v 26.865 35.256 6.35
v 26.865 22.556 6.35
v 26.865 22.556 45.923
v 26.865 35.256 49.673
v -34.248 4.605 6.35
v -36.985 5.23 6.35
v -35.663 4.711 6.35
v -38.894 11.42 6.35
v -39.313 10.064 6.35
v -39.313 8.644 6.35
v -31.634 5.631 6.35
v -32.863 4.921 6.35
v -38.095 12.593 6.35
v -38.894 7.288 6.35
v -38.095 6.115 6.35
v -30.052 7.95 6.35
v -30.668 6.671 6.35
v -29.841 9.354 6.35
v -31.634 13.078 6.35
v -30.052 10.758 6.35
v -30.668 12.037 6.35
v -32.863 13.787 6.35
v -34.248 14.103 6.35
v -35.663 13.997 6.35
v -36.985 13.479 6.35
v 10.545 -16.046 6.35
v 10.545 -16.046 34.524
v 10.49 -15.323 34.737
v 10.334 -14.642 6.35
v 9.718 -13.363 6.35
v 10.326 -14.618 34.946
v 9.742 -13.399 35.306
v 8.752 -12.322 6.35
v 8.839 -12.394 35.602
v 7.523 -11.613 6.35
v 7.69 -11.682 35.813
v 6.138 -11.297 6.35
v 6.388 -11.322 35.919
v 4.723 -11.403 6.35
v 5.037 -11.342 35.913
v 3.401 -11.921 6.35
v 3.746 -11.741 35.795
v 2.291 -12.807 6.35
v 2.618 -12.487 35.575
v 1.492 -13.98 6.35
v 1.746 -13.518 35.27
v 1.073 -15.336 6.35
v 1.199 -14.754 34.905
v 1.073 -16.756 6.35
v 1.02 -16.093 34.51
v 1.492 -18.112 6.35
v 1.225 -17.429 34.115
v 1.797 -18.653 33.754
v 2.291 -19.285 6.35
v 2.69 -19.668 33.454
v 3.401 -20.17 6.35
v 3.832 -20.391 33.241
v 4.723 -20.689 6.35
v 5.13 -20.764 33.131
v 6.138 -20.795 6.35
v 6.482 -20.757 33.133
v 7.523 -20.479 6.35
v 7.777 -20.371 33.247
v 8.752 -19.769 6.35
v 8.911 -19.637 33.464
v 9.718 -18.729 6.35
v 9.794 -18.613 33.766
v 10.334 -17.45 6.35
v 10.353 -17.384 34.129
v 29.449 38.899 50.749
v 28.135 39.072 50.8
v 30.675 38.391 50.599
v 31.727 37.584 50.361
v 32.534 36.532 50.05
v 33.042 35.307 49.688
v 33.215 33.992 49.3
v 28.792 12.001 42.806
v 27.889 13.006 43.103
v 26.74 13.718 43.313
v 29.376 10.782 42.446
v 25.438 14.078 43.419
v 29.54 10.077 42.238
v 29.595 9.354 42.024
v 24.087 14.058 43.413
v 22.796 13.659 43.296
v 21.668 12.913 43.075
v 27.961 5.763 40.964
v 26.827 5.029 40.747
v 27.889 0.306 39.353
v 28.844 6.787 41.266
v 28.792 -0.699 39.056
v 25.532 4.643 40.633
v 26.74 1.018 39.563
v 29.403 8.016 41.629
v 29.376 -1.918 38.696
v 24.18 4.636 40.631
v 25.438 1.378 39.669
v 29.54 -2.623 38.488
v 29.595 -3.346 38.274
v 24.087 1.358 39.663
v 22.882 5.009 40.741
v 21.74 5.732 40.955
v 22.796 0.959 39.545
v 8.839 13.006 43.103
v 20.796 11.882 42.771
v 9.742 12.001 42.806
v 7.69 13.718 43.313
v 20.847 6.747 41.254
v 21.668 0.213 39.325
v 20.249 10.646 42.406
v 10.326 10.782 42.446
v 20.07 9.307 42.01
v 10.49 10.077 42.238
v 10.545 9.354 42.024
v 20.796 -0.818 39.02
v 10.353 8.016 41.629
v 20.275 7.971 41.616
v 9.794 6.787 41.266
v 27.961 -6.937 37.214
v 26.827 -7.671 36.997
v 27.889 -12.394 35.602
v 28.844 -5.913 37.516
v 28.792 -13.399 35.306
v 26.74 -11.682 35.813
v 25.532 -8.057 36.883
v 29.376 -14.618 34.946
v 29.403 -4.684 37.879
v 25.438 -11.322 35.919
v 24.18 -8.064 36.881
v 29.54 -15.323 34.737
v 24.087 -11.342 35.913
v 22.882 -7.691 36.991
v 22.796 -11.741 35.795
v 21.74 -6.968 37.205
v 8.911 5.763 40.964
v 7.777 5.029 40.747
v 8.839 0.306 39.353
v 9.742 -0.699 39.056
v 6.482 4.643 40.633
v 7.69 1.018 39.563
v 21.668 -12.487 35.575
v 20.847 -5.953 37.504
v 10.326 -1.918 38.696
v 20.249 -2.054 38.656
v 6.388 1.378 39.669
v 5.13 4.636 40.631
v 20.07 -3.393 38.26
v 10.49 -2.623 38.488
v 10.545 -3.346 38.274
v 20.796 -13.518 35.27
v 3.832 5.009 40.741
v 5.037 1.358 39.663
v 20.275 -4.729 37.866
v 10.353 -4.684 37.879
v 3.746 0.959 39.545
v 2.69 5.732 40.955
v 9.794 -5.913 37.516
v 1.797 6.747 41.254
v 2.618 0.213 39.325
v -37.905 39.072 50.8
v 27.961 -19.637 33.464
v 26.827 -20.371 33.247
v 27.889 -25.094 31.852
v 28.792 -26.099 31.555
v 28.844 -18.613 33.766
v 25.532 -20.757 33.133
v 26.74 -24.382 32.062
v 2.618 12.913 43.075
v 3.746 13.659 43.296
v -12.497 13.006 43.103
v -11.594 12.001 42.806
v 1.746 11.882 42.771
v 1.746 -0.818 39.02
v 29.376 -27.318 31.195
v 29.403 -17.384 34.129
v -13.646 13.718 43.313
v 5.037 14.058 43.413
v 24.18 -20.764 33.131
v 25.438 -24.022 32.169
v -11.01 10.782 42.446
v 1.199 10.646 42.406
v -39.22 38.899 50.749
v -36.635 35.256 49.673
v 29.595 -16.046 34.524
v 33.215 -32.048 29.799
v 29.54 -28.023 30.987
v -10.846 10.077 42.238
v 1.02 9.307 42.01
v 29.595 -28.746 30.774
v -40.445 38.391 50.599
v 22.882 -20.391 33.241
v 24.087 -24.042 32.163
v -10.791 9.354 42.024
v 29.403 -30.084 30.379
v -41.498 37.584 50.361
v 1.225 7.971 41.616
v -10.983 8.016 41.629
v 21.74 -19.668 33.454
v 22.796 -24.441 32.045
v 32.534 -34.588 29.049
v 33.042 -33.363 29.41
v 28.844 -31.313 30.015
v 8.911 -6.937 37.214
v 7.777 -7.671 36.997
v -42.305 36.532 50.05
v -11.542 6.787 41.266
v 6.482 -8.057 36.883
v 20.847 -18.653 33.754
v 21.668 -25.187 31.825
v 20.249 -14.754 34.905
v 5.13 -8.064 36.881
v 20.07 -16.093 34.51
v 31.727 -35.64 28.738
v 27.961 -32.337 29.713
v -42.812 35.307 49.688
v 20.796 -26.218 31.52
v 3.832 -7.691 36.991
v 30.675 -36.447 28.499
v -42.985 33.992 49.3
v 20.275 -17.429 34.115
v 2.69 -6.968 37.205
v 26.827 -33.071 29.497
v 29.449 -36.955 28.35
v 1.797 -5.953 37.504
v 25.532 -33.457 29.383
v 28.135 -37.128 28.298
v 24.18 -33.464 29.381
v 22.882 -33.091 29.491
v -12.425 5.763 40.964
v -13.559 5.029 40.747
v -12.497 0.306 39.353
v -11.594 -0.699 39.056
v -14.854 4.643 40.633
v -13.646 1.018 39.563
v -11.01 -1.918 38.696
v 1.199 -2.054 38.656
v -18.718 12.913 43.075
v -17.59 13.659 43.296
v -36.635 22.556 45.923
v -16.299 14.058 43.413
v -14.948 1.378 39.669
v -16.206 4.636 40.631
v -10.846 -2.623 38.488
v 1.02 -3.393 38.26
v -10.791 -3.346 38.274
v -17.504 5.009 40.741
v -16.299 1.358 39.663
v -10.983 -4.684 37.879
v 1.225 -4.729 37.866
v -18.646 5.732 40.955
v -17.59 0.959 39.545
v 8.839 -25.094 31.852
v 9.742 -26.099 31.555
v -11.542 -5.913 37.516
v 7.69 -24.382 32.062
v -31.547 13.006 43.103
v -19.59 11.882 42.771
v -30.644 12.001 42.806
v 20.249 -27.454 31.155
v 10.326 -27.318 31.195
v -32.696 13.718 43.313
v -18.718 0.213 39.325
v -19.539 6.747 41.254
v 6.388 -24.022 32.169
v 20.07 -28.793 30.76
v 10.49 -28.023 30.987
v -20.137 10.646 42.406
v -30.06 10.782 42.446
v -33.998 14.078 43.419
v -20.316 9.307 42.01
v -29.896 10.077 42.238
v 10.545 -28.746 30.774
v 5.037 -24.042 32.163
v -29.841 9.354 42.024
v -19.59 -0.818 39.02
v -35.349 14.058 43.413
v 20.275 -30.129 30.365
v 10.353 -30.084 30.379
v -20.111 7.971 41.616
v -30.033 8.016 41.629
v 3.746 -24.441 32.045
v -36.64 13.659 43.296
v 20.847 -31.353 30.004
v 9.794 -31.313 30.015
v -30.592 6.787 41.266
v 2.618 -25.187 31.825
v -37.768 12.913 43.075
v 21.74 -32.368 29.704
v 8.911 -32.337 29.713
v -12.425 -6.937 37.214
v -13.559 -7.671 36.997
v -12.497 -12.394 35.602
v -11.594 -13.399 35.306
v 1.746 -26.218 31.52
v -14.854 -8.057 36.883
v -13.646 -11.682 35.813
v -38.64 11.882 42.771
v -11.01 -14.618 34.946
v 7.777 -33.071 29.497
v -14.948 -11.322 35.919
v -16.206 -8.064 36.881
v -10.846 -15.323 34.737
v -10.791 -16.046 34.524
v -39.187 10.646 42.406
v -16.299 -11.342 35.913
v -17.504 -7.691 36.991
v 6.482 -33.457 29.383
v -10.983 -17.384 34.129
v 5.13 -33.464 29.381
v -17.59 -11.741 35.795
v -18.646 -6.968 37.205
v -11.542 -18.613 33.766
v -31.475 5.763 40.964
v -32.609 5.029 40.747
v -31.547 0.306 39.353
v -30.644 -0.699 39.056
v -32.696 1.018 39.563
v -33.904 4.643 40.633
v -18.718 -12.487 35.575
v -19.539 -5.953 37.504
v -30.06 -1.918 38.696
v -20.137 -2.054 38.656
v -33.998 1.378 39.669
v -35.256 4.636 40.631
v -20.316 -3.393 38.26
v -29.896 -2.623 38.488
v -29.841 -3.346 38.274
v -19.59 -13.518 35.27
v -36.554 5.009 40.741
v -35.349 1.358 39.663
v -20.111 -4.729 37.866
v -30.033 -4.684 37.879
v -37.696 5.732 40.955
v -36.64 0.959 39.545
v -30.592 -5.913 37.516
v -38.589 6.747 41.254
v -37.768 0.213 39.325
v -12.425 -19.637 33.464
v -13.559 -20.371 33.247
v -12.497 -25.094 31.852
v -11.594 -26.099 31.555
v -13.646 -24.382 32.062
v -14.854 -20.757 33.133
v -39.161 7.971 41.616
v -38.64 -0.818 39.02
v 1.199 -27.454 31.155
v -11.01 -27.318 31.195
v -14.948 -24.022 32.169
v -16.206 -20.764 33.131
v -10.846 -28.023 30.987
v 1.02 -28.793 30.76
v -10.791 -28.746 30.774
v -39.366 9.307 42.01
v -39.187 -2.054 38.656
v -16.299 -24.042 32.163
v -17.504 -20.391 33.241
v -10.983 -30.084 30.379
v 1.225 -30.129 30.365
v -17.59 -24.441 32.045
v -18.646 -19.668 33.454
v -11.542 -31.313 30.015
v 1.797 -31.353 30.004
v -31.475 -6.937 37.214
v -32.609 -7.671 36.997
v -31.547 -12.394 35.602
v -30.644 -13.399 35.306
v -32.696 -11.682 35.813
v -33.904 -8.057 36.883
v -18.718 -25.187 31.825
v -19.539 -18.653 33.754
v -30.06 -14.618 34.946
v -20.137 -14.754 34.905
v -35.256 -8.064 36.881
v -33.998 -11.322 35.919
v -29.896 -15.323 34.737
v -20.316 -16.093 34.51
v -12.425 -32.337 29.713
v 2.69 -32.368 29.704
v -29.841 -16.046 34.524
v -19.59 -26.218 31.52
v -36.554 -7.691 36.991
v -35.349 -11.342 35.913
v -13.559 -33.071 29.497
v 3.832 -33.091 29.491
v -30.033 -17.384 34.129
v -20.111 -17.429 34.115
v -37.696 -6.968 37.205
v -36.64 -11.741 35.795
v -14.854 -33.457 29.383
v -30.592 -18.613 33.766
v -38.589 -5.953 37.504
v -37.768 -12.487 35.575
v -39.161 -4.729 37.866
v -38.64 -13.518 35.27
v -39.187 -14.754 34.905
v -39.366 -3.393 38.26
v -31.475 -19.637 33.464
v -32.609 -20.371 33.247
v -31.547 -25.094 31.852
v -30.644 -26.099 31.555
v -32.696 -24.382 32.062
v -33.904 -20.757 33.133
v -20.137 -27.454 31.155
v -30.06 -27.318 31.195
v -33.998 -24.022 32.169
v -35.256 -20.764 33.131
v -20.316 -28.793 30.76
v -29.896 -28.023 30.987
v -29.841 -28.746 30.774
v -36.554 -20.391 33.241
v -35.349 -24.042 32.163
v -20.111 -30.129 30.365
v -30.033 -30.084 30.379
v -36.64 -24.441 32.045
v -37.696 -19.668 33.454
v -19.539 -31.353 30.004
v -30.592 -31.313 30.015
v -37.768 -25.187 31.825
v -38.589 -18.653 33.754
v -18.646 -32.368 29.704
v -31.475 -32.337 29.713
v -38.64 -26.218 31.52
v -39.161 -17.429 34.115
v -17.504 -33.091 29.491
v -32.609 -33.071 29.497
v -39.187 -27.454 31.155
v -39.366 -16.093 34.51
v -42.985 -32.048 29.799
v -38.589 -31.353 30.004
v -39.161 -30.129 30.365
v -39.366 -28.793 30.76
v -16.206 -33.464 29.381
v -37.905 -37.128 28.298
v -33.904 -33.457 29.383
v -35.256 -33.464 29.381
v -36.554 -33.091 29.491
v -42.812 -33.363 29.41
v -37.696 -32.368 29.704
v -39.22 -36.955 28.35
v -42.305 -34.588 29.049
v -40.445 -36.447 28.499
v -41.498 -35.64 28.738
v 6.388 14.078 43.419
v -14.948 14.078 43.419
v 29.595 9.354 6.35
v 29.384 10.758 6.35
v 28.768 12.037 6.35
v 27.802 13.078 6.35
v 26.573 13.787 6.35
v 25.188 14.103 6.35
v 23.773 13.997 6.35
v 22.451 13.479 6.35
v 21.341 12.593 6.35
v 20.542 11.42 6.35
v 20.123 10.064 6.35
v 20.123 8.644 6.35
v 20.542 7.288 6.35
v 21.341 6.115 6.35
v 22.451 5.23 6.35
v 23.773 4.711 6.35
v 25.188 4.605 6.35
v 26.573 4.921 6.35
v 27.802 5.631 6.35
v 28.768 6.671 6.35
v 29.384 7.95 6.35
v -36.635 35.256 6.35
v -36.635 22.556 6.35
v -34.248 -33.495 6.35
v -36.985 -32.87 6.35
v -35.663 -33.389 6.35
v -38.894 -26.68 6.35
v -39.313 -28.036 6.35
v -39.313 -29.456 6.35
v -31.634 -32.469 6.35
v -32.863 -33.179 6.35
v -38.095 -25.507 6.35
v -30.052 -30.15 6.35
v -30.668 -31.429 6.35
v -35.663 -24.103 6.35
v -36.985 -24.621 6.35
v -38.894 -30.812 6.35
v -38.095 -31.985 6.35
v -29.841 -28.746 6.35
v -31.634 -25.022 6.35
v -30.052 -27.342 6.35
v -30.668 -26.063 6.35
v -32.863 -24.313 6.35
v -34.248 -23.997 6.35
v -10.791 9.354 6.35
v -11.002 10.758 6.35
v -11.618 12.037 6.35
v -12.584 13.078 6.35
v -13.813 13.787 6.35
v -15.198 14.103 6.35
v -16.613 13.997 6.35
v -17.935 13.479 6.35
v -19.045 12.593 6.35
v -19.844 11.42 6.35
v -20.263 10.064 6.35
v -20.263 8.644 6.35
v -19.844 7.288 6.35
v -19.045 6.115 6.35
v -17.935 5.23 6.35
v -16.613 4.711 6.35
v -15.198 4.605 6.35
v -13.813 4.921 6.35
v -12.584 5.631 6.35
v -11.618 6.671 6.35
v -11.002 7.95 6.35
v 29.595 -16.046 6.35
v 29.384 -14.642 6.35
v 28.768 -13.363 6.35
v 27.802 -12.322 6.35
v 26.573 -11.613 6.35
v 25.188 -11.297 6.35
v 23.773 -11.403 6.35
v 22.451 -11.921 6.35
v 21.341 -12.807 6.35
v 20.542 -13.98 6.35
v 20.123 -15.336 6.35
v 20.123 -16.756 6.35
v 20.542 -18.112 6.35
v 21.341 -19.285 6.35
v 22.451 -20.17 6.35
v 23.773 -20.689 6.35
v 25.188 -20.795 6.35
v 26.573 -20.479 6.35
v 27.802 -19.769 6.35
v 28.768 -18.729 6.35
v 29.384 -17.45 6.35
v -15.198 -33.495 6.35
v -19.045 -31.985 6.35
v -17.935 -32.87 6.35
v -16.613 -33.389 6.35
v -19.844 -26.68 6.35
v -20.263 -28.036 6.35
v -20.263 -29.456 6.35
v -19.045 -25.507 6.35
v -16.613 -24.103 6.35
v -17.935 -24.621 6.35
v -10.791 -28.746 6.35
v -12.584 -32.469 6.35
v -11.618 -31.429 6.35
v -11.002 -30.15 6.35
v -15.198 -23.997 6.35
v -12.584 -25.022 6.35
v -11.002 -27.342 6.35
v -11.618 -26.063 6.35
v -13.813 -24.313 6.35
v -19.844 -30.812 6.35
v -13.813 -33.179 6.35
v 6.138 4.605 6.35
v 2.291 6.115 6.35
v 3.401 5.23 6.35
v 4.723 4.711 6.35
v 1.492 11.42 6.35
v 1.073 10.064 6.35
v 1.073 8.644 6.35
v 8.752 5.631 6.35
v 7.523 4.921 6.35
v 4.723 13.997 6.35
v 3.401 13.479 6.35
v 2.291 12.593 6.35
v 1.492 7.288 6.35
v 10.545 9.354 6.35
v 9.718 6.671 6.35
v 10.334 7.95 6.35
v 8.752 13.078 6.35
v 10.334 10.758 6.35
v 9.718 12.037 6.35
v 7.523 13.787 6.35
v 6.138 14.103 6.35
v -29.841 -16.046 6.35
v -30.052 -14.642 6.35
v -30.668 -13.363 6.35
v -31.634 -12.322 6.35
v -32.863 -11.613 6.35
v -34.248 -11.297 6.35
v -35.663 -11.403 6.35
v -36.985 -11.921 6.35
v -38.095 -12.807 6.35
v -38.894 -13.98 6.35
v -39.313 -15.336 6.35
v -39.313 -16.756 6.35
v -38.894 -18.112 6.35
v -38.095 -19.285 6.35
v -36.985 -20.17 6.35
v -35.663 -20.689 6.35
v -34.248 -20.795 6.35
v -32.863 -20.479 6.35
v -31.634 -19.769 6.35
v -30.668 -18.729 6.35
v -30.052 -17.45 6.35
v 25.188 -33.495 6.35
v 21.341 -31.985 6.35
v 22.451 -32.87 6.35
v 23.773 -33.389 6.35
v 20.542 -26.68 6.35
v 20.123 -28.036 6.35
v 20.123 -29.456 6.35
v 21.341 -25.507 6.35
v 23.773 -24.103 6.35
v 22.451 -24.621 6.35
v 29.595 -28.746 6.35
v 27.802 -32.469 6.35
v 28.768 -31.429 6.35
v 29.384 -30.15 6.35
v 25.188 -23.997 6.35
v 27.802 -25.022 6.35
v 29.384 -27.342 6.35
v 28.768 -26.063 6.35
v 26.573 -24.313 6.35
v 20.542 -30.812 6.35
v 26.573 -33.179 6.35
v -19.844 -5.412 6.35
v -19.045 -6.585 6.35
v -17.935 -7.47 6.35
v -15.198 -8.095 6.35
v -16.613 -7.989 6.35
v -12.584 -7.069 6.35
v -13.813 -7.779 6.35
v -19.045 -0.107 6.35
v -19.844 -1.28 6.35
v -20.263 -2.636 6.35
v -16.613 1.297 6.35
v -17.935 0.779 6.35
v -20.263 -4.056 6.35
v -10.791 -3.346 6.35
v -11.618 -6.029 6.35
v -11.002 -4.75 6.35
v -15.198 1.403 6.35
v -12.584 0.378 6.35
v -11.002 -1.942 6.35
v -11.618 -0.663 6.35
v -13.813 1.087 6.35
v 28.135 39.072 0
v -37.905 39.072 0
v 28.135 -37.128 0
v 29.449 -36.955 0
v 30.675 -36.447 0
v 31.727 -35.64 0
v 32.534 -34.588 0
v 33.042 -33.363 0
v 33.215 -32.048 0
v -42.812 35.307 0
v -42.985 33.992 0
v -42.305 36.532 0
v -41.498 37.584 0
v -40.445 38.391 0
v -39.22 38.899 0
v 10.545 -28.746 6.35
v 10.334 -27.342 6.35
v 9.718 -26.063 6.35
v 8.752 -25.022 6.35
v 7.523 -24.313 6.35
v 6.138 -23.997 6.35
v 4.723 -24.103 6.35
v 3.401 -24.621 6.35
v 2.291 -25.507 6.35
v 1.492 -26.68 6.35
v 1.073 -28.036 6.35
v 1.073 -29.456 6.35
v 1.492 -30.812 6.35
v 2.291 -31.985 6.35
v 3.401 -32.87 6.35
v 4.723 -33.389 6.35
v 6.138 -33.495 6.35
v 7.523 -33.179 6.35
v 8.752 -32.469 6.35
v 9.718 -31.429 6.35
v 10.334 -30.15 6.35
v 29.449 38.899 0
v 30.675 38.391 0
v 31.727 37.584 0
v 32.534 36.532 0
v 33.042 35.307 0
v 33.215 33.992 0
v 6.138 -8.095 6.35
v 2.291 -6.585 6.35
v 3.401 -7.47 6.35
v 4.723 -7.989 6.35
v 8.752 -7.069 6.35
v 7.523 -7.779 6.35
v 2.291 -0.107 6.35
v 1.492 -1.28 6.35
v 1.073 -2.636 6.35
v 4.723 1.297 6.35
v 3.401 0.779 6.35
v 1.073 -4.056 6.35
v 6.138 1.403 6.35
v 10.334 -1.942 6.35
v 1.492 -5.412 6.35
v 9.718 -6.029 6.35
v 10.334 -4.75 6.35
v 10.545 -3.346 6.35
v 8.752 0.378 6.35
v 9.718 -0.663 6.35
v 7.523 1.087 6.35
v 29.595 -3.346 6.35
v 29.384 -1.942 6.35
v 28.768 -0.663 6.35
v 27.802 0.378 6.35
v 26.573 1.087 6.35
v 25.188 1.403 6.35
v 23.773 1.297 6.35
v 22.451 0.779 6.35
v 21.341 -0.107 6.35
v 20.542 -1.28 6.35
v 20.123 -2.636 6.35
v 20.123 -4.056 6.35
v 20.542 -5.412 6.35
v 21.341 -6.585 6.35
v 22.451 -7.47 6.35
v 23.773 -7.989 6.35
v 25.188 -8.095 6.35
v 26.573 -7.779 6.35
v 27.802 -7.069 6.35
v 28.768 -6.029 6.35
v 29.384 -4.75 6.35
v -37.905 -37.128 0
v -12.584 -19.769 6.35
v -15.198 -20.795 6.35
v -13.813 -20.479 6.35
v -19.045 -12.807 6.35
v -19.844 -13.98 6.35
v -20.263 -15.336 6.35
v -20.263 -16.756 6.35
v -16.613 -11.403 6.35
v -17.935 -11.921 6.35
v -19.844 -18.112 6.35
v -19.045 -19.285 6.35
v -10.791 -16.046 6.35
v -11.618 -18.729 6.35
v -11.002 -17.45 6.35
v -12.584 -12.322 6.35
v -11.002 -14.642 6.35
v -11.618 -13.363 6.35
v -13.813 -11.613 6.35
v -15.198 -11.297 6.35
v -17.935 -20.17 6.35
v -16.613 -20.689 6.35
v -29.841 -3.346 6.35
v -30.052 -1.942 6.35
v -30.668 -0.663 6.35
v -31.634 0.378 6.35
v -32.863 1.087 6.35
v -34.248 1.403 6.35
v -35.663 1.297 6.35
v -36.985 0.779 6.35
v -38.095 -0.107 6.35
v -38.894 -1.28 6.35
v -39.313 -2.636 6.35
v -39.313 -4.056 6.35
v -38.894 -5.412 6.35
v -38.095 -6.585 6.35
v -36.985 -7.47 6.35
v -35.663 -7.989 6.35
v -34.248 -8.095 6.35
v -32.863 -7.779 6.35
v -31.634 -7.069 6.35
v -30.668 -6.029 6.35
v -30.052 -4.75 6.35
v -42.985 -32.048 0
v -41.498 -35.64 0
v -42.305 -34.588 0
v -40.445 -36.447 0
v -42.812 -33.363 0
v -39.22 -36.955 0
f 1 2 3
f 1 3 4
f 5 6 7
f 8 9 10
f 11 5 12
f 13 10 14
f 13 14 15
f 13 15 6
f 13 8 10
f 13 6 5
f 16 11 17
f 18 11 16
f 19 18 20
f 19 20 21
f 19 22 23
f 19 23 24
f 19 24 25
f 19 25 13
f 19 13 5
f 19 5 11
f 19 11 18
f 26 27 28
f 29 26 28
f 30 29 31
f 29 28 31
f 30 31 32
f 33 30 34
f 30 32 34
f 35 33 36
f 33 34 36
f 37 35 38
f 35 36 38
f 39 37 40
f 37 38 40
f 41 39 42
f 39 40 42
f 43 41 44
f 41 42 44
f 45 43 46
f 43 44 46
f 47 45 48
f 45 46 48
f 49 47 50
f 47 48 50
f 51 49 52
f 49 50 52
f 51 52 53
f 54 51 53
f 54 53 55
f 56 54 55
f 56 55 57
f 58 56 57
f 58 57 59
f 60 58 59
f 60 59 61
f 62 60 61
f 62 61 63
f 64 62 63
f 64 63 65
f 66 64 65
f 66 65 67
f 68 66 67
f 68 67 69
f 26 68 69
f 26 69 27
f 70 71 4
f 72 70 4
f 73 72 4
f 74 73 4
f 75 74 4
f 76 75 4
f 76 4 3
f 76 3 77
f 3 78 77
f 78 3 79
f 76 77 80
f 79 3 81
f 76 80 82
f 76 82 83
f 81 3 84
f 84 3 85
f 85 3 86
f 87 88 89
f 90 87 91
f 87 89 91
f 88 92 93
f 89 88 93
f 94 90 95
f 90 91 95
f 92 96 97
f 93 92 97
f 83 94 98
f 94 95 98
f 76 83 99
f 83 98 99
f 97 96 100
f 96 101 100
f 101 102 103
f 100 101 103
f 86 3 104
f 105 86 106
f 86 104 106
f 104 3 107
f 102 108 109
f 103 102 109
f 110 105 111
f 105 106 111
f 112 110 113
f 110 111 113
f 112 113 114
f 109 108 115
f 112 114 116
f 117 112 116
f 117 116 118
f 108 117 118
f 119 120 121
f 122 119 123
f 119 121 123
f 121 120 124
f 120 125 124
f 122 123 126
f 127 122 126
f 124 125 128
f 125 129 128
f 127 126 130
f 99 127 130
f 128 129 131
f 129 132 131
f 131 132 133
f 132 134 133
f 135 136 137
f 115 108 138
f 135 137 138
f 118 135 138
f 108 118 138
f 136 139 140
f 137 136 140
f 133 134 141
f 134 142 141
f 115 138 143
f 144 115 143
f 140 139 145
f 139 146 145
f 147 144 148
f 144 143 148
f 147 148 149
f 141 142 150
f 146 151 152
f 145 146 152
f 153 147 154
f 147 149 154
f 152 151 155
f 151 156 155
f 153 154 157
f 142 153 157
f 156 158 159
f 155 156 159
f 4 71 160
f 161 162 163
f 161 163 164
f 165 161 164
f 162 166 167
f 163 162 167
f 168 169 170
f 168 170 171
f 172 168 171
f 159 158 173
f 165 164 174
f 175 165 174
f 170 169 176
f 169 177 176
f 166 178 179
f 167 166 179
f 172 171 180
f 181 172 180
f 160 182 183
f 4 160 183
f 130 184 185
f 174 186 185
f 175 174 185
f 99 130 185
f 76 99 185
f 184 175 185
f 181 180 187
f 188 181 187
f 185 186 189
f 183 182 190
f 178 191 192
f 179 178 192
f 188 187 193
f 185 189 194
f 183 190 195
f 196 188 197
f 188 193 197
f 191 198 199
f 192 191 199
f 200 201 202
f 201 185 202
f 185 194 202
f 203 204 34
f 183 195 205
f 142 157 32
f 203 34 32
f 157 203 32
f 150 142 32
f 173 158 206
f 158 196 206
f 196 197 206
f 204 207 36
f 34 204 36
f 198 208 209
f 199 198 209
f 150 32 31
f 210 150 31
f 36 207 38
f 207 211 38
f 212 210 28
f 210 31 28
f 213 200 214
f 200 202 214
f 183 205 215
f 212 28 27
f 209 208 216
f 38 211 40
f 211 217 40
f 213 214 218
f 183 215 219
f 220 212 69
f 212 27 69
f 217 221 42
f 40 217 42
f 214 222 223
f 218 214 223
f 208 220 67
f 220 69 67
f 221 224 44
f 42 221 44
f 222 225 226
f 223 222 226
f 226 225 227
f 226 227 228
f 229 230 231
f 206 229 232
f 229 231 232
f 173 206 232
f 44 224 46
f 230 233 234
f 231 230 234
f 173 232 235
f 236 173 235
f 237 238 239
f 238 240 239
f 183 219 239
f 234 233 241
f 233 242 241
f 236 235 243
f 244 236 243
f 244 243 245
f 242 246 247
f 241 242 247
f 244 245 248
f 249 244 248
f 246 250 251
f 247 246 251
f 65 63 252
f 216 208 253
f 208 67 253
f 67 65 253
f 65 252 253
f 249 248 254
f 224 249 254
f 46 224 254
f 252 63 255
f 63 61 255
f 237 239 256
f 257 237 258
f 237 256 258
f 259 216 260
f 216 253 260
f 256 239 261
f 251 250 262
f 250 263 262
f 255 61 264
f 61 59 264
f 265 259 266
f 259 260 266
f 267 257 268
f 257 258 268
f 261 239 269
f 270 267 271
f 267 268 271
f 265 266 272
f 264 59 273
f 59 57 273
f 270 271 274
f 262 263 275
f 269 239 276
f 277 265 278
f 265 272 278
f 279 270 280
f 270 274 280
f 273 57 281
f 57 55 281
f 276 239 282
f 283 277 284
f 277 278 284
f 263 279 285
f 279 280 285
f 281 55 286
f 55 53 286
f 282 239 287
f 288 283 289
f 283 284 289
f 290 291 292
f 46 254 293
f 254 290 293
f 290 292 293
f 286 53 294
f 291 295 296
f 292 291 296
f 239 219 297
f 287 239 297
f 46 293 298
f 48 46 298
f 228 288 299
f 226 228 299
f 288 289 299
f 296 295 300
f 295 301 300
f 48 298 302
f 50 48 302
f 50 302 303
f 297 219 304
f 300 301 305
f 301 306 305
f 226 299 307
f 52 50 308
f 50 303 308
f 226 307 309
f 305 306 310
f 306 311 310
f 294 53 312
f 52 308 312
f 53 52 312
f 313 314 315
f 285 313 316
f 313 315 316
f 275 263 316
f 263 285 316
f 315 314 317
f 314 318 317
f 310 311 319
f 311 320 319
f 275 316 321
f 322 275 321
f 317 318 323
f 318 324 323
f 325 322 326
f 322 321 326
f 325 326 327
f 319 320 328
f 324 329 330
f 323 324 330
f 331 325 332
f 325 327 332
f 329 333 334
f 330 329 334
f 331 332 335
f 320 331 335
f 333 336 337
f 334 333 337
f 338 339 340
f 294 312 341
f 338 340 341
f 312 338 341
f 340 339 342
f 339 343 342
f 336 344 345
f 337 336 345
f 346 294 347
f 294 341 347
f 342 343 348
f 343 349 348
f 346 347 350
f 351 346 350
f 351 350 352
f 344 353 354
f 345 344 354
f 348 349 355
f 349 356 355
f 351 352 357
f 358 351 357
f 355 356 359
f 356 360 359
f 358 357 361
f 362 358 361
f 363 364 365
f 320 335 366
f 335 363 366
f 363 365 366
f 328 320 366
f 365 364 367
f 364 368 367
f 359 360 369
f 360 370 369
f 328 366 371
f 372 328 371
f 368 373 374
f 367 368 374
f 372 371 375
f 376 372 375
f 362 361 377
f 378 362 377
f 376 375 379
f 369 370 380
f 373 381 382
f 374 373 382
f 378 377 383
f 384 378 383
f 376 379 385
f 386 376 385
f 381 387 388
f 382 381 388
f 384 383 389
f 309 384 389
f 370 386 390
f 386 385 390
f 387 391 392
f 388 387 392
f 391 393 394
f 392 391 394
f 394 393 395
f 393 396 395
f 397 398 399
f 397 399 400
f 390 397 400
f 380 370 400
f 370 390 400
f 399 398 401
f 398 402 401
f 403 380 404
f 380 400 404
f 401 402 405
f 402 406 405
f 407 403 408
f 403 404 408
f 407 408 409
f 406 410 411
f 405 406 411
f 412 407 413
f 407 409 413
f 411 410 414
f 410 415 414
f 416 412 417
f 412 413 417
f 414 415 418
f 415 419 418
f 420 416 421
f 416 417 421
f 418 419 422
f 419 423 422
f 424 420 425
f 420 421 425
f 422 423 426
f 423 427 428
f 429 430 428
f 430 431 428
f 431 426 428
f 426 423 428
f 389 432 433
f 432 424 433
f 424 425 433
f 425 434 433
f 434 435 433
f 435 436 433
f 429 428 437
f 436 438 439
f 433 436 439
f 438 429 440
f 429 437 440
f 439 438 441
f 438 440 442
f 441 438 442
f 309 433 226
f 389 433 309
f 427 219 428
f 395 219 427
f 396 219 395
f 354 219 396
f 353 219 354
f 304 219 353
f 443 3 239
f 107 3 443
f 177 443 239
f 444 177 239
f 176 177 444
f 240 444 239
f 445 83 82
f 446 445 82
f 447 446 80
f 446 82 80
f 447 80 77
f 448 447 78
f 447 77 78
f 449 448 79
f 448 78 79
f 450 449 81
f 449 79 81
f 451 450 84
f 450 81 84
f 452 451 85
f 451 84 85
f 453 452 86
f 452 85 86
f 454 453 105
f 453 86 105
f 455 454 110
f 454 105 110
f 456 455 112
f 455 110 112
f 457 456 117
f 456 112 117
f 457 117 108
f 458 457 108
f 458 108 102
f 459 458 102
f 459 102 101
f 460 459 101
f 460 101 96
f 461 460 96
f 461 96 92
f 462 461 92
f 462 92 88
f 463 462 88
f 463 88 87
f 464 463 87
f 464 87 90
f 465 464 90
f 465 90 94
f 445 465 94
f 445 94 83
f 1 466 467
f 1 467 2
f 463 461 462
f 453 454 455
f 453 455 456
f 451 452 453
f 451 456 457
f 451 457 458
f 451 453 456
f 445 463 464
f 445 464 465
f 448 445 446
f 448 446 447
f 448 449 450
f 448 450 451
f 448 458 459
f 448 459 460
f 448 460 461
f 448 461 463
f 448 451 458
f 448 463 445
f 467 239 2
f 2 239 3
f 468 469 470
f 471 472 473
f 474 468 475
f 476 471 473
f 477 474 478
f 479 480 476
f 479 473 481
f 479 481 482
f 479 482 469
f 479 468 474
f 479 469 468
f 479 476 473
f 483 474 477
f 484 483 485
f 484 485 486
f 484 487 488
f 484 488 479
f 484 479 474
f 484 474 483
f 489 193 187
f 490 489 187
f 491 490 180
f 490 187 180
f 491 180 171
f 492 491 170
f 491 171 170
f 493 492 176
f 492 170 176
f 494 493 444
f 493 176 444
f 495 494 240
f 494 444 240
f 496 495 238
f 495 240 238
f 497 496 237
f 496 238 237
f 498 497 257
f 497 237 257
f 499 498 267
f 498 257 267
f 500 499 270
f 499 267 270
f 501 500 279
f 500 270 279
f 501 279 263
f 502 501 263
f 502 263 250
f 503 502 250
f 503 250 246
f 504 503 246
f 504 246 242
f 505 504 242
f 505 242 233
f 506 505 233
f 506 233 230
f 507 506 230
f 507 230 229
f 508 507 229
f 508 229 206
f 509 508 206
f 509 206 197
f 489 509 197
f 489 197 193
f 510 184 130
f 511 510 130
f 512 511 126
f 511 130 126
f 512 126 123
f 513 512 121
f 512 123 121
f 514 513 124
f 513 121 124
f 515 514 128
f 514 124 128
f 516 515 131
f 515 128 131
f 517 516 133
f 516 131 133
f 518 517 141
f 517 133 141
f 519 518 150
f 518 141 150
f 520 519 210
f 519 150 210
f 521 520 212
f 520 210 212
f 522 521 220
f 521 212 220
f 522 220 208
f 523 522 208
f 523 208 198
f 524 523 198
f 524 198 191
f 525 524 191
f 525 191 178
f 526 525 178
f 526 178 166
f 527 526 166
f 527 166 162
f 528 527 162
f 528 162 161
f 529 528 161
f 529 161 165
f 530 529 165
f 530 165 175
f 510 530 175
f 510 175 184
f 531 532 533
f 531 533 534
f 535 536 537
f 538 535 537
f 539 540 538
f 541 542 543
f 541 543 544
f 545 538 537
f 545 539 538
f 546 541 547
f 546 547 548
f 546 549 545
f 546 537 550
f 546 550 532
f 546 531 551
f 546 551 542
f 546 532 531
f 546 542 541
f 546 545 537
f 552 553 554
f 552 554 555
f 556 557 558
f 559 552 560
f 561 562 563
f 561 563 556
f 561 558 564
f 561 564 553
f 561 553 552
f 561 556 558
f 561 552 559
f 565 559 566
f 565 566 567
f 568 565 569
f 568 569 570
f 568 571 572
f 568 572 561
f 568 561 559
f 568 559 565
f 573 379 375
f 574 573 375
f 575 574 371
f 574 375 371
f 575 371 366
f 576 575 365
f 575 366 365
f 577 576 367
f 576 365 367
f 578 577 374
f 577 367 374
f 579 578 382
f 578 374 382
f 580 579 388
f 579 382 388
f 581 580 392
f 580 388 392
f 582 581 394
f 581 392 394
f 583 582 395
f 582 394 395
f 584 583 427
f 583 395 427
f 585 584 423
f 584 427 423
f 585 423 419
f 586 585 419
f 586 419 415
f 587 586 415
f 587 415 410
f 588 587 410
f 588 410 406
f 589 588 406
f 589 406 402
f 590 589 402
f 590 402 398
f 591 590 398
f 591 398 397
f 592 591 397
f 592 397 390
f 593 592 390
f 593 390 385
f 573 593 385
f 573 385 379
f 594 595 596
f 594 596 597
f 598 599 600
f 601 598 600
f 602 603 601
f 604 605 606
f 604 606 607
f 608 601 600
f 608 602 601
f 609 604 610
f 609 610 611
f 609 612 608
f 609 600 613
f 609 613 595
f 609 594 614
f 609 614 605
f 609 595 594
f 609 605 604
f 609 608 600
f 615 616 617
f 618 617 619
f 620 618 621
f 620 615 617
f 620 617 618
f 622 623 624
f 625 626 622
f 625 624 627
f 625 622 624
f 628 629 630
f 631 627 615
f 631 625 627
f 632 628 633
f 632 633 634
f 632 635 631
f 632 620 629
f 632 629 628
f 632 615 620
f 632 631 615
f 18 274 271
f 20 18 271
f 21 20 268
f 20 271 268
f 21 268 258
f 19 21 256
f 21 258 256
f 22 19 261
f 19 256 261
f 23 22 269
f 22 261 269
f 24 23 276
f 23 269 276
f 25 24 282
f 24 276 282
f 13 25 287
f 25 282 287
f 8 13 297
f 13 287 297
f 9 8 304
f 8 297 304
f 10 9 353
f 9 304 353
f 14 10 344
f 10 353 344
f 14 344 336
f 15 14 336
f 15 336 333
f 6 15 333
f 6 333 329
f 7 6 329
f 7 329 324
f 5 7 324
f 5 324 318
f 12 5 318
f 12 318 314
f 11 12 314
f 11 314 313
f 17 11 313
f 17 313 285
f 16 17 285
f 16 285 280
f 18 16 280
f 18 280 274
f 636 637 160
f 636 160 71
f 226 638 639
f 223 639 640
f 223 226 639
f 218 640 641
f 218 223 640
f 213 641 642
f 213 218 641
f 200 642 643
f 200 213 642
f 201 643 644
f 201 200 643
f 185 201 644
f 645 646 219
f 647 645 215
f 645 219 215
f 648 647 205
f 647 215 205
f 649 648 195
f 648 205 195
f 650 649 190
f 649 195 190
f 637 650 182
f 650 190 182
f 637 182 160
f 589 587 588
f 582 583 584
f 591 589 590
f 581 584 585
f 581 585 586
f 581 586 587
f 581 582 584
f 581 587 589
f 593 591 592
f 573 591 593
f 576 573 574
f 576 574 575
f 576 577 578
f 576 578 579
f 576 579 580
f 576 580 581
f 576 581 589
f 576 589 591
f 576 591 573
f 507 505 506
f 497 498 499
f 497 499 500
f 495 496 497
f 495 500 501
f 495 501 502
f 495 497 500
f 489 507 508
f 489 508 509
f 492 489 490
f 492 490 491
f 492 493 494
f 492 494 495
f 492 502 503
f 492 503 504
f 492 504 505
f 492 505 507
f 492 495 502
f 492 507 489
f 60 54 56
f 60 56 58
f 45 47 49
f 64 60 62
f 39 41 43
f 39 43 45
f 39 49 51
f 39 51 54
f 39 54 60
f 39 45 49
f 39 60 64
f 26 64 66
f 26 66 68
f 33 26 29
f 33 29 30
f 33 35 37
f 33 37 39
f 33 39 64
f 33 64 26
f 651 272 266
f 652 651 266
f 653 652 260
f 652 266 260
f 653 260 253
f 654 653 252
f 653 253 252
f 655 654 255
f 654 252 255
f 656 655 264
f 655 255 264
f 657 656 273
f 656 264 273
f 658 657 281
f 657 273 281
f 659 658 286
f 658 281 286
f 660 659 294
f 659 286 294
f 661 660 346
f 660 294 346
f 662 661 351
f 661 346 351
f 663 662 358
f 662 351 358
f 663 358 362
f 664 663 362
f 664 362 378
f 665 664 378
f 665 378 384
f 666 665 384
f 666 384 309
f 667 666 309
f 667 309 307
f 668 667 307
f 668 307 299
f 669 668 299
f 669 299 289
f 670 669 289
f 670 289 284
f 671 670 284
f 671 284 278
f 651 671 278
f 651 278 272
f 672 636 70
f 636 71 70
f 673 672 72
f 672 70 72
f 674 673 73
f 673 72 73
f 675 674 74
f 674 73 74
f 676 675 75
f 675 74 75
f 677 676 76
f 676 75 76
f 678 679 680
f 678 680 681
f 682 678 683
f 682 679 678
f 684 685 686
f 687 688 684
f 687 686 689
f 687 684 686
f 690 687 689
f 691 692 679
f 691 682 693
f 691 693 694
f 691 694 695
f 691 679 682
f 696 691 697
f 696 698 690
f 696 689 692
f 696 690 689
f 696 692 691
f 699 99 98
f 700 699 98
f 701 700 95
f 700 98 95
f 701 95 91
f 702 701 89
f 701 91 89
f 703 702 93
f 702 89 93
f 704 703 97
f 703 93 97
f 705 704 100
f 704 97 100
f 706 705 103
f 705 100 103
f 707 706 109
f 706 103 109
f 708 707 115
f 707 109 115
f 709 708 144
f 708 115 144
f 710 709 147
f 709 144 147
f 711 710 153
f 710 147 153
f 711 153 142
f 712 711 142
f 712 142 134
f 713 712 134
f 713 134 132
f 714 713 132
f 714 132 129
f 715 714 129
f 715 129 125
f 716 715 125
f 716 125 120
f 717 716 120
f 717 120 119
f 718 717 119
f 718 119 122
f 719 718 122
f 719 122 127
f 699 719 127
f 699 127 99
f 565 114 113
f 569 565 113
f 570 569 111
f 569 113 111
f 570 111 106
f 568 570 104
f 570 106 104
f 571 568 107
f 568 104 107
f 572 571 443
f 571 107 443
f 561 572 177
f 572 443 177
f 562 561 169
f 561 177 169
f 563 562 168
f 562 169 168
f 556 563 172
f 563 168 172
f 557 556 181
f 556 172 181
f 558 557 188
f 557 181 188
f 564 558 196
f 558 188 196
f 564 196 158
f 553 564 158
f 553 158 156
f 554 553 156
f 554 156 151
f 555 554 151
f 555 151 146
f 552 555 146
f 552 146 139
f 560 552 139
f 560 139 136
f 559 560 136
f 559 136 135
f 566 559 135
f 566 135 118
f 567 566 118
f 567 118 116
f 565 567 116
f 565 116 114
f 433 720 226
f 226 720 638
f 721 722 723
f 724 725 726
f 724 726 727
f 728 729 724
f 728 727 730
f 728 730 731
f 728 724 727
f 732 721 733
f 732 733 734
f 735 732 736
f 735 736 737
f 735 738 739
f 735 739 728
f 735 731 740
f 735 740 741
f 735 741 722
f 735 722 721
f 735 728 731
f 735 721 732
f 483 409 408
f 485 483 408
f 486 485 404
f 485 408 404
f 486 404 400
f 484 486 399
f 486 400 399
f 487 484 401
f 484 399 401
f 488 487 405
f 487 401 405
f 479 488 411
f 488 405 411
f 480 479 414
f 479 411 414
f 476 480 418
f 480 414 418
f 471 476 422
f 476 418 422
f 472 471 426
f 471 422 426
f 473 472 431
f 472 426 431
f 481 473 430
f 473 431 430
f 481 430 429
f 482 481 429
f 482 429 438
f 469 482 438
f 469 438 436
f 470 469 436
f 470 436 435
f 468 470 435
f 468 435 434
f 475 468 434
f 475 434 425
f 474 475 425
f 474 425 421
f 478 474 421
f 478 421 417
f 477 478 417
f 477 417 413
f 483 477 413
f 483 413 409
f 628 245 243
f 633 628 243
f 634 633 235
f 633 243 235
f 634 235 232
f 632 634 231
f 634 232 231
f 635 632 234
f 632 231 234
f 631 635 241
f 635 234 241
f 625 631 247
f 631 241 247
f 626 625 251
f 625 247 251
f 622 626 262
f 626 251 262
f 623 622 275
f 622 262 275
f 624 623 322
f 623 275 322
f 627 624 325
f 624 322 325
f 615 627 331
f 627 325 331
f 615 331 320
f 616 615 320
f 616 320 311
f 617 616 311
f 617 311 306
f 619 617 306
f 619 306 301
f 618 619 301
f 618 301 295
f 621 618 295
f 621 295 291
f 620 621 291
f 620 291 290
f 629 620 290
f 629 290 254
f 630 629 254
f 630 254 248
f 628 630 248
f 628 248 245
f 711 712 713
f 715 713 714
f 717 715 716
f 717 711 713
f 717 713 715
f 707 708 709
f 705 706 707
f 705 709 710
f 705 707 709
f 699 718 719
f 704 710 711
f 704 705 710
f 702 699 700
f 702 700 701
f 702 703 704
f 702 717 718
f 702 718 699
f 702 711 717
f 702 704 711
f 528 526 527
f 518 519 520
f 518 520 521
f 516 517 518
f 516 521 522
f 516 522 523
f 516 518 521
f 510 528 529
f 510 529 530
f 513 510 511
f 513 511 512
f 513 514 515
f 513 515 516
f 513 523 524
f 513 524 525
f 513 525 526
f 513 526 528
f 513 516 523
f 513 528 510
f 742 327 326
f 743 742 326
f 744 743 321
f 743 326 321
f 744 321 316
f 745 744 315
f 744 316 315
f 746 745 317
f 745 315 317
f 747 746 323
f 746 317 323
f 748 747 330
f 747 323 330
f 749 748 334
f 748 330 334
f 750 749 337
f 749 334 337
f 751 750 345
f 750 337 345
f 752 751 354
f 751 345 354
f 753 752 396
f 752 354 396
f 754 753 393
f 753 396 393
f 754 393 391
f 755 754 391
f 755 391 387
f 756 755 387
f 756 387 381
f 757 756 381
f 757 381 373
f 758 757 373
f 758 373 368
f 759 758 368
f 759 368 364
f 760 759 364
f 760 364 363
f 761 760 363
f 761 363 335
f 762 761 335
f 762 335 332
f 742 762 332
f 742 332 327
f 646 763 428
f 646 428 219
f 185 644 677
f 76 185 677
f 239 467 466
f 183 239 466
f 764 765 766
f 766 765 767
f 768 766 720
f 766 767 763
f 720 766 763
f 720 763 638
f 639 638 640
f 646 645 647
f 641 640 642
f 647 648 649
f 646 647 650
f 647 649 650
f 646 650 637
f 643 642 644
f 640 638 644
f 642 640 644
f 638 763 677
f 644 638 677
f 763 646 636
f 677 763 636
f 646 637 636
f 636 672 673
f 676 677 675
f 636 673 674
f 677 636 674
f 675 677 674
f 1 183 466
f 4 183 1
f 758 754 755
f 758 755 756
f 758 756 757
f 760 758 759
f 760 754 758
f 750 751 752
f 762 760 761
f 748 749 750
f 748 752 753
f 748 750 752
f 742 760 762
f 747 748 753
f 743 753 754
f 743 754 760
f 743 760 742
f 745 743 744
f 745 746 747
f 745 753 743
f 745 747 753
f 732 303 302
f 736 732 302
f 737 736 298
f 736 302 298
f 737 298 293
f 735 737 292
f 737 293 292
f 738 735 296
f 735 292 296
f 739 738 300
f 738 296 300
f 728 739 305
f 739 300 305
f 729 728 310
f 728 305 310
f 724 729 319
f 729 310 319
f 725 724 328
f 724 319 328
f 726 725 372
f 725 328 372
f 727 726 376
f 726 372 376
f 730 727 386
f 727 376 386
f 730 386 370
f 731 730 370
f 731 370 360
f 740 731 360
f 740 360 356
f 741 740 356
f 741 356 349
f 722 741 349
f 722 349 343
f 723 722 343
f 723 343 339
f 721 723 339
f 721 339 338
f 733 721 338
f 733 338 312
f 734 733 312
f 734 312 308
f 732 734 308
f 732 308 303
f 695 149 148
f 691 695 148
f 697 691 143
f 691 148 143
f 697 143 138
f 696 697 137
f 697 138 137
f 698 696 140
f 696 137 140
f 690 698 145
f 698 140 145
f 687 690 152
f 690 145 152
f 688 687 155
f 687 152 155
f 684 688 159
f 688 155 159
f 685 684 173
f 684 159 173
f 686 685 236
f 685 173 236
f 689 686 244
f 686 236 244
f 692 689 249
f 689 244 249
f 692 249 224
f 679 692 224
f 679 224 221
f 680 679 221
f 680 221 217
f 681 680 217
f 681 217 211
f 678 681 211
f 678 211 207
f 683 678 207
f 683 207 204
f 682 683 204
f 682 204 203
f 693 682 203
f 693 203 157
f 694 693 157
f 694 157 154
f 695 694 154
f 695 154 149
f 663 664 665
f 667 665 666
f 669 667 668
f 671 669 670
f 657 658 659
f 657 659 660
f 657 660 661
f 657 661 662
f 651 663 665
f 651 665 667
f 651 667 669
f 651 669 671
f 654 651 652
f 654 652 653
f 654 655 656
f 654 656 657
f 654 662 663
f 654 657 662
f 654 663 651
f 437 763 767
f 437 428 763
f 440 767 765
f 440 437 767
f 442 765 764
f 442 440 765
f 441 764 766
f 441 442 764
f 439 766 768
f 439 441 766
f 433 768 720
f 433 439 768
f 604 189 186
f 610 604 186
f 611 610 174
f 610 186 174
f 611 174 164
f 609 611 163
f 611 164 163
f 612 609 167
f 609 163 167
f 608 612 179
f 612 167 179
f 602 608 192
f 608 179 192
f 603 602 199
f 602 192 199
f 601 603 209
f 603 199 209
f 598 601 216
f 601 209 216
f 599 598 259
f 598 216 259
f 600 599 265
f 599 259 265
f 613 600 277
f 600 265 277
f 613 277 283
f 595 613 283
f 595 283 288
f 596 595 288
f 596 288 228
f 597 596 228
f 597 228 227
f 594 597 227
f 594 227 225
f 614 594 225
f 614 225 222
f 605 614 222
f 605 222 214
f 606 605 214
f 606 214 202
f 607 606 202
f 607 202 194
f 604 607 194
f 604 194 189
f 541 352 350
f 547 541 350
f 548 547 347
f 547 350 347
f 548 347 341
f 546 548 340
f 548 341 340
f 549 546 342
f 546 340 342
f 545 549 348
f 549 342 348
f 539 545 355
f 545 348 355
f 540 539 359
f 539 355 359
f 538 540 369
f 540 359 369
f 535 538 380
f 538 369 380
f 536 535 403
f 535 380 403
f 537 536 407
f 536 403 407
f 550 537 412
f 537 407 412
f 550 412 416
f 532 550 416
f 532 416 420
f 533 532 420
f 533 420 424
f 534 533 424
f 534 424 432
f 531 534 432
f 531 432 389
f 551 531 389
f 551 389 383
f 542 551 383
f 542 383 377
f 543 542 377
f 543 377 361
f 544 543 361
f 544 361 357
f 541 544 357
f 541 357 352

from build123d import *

# Parameters (mm, degrees)
F0_W     = 76.2
F0_H     = 76.2
F1_DEPTH = 50.8
F2_R     = 4.7625
F2_W     = 63.5
F2_H     = 12.7
F3_DEPTH = 44.45
F5_DEPTH = 76.2
F6_R     = 5.08


with BuildPart() as f1:
    # F0 (on Top) → F1 (new body)
    with BuildSketch(Plane.XY):
        with Locations((-4.885403, 0.97207)):
            Rectangle(F0_W, F0_H)
    extrude(amount=F1_DEPTH)

    # F2 (on face) → F3 (cut)
    with BuildSketch(Plane.XY.offset(50.8)):
        with Locations((-34.603403, 9.35407)):
            Circle(F2_R)
        with Locations((-15.553403, 9.35407)):
            Circle(F2_R)
        with Locations((-34.603403, -3.34593)):
            Circle(F2_R)
        with Locations((-34.603403, -16.04593)):
            Circle(F2_R)
        with Locations((-34.603403, -28.74593)):
            Circle(F2_R)
        with Locations((-15.553403, -3.34593)):
            Circle(F2_R)
        with Locations((-15.553403, -16.04593)):
            Circle(F2_R)
        with Locations((-15.553403, -28.74593)):
            Circle(F2_R)
        with Locations((5.782597, 9.35407)):
            Circle(F2_R)
        with Locations((5.782597, -3.34593)):
            Circle(F2_R)
        with Locations((5.782597, -16.04593)):
            Circle(F2_R)
        with Locations((5.782597, -28.74593)):
            Circle(F2_R)
        with Locations((24.832597, 9.35407)):
            Circle(F2_R)
        with Locations((24.832597, -3.34593)):
            Circle(F2_R)
        with Locations((24.832597, -16.04593)):
            Circle(F2_R)
        with Locations((24.832597, -28.74593)):
            Circle(F2_R)
        with Locations((-4.885403, 28.906011)):
            Rectangle(F2_W, F2_H)
    extrude(amount=-F3_DEPTH, mode=Mode.SUBTRACT)

    # F4 (on face) → F5 (cut)
    with BuildSketch(Plane(origin=(-42.985403, 0, 0), x_dir=(0, -1, 0), z_dir=(-1, 0, 0))):
        Polygon((37.12793, 50.8), (-39.07207, 50.8), (37.12793, 28.298467), align=None)
    extrude(amount=-F5_DEPTH, mode=Mode.SUBTRACT)

    # F6
    f6_edges = [f1.edges().sort_by_distance(p)[0] for p in [
        (33.214597, -37.12793, 14.149234),
        (-42.985403, -37.12793, 14.149234),
        (33.214597, 39.07207, 25.4),
        (-42.985403, 39.07207, 25.4),
    ]]
    fillet(f6_edges, radius=F6_R)


solid = f1.part
